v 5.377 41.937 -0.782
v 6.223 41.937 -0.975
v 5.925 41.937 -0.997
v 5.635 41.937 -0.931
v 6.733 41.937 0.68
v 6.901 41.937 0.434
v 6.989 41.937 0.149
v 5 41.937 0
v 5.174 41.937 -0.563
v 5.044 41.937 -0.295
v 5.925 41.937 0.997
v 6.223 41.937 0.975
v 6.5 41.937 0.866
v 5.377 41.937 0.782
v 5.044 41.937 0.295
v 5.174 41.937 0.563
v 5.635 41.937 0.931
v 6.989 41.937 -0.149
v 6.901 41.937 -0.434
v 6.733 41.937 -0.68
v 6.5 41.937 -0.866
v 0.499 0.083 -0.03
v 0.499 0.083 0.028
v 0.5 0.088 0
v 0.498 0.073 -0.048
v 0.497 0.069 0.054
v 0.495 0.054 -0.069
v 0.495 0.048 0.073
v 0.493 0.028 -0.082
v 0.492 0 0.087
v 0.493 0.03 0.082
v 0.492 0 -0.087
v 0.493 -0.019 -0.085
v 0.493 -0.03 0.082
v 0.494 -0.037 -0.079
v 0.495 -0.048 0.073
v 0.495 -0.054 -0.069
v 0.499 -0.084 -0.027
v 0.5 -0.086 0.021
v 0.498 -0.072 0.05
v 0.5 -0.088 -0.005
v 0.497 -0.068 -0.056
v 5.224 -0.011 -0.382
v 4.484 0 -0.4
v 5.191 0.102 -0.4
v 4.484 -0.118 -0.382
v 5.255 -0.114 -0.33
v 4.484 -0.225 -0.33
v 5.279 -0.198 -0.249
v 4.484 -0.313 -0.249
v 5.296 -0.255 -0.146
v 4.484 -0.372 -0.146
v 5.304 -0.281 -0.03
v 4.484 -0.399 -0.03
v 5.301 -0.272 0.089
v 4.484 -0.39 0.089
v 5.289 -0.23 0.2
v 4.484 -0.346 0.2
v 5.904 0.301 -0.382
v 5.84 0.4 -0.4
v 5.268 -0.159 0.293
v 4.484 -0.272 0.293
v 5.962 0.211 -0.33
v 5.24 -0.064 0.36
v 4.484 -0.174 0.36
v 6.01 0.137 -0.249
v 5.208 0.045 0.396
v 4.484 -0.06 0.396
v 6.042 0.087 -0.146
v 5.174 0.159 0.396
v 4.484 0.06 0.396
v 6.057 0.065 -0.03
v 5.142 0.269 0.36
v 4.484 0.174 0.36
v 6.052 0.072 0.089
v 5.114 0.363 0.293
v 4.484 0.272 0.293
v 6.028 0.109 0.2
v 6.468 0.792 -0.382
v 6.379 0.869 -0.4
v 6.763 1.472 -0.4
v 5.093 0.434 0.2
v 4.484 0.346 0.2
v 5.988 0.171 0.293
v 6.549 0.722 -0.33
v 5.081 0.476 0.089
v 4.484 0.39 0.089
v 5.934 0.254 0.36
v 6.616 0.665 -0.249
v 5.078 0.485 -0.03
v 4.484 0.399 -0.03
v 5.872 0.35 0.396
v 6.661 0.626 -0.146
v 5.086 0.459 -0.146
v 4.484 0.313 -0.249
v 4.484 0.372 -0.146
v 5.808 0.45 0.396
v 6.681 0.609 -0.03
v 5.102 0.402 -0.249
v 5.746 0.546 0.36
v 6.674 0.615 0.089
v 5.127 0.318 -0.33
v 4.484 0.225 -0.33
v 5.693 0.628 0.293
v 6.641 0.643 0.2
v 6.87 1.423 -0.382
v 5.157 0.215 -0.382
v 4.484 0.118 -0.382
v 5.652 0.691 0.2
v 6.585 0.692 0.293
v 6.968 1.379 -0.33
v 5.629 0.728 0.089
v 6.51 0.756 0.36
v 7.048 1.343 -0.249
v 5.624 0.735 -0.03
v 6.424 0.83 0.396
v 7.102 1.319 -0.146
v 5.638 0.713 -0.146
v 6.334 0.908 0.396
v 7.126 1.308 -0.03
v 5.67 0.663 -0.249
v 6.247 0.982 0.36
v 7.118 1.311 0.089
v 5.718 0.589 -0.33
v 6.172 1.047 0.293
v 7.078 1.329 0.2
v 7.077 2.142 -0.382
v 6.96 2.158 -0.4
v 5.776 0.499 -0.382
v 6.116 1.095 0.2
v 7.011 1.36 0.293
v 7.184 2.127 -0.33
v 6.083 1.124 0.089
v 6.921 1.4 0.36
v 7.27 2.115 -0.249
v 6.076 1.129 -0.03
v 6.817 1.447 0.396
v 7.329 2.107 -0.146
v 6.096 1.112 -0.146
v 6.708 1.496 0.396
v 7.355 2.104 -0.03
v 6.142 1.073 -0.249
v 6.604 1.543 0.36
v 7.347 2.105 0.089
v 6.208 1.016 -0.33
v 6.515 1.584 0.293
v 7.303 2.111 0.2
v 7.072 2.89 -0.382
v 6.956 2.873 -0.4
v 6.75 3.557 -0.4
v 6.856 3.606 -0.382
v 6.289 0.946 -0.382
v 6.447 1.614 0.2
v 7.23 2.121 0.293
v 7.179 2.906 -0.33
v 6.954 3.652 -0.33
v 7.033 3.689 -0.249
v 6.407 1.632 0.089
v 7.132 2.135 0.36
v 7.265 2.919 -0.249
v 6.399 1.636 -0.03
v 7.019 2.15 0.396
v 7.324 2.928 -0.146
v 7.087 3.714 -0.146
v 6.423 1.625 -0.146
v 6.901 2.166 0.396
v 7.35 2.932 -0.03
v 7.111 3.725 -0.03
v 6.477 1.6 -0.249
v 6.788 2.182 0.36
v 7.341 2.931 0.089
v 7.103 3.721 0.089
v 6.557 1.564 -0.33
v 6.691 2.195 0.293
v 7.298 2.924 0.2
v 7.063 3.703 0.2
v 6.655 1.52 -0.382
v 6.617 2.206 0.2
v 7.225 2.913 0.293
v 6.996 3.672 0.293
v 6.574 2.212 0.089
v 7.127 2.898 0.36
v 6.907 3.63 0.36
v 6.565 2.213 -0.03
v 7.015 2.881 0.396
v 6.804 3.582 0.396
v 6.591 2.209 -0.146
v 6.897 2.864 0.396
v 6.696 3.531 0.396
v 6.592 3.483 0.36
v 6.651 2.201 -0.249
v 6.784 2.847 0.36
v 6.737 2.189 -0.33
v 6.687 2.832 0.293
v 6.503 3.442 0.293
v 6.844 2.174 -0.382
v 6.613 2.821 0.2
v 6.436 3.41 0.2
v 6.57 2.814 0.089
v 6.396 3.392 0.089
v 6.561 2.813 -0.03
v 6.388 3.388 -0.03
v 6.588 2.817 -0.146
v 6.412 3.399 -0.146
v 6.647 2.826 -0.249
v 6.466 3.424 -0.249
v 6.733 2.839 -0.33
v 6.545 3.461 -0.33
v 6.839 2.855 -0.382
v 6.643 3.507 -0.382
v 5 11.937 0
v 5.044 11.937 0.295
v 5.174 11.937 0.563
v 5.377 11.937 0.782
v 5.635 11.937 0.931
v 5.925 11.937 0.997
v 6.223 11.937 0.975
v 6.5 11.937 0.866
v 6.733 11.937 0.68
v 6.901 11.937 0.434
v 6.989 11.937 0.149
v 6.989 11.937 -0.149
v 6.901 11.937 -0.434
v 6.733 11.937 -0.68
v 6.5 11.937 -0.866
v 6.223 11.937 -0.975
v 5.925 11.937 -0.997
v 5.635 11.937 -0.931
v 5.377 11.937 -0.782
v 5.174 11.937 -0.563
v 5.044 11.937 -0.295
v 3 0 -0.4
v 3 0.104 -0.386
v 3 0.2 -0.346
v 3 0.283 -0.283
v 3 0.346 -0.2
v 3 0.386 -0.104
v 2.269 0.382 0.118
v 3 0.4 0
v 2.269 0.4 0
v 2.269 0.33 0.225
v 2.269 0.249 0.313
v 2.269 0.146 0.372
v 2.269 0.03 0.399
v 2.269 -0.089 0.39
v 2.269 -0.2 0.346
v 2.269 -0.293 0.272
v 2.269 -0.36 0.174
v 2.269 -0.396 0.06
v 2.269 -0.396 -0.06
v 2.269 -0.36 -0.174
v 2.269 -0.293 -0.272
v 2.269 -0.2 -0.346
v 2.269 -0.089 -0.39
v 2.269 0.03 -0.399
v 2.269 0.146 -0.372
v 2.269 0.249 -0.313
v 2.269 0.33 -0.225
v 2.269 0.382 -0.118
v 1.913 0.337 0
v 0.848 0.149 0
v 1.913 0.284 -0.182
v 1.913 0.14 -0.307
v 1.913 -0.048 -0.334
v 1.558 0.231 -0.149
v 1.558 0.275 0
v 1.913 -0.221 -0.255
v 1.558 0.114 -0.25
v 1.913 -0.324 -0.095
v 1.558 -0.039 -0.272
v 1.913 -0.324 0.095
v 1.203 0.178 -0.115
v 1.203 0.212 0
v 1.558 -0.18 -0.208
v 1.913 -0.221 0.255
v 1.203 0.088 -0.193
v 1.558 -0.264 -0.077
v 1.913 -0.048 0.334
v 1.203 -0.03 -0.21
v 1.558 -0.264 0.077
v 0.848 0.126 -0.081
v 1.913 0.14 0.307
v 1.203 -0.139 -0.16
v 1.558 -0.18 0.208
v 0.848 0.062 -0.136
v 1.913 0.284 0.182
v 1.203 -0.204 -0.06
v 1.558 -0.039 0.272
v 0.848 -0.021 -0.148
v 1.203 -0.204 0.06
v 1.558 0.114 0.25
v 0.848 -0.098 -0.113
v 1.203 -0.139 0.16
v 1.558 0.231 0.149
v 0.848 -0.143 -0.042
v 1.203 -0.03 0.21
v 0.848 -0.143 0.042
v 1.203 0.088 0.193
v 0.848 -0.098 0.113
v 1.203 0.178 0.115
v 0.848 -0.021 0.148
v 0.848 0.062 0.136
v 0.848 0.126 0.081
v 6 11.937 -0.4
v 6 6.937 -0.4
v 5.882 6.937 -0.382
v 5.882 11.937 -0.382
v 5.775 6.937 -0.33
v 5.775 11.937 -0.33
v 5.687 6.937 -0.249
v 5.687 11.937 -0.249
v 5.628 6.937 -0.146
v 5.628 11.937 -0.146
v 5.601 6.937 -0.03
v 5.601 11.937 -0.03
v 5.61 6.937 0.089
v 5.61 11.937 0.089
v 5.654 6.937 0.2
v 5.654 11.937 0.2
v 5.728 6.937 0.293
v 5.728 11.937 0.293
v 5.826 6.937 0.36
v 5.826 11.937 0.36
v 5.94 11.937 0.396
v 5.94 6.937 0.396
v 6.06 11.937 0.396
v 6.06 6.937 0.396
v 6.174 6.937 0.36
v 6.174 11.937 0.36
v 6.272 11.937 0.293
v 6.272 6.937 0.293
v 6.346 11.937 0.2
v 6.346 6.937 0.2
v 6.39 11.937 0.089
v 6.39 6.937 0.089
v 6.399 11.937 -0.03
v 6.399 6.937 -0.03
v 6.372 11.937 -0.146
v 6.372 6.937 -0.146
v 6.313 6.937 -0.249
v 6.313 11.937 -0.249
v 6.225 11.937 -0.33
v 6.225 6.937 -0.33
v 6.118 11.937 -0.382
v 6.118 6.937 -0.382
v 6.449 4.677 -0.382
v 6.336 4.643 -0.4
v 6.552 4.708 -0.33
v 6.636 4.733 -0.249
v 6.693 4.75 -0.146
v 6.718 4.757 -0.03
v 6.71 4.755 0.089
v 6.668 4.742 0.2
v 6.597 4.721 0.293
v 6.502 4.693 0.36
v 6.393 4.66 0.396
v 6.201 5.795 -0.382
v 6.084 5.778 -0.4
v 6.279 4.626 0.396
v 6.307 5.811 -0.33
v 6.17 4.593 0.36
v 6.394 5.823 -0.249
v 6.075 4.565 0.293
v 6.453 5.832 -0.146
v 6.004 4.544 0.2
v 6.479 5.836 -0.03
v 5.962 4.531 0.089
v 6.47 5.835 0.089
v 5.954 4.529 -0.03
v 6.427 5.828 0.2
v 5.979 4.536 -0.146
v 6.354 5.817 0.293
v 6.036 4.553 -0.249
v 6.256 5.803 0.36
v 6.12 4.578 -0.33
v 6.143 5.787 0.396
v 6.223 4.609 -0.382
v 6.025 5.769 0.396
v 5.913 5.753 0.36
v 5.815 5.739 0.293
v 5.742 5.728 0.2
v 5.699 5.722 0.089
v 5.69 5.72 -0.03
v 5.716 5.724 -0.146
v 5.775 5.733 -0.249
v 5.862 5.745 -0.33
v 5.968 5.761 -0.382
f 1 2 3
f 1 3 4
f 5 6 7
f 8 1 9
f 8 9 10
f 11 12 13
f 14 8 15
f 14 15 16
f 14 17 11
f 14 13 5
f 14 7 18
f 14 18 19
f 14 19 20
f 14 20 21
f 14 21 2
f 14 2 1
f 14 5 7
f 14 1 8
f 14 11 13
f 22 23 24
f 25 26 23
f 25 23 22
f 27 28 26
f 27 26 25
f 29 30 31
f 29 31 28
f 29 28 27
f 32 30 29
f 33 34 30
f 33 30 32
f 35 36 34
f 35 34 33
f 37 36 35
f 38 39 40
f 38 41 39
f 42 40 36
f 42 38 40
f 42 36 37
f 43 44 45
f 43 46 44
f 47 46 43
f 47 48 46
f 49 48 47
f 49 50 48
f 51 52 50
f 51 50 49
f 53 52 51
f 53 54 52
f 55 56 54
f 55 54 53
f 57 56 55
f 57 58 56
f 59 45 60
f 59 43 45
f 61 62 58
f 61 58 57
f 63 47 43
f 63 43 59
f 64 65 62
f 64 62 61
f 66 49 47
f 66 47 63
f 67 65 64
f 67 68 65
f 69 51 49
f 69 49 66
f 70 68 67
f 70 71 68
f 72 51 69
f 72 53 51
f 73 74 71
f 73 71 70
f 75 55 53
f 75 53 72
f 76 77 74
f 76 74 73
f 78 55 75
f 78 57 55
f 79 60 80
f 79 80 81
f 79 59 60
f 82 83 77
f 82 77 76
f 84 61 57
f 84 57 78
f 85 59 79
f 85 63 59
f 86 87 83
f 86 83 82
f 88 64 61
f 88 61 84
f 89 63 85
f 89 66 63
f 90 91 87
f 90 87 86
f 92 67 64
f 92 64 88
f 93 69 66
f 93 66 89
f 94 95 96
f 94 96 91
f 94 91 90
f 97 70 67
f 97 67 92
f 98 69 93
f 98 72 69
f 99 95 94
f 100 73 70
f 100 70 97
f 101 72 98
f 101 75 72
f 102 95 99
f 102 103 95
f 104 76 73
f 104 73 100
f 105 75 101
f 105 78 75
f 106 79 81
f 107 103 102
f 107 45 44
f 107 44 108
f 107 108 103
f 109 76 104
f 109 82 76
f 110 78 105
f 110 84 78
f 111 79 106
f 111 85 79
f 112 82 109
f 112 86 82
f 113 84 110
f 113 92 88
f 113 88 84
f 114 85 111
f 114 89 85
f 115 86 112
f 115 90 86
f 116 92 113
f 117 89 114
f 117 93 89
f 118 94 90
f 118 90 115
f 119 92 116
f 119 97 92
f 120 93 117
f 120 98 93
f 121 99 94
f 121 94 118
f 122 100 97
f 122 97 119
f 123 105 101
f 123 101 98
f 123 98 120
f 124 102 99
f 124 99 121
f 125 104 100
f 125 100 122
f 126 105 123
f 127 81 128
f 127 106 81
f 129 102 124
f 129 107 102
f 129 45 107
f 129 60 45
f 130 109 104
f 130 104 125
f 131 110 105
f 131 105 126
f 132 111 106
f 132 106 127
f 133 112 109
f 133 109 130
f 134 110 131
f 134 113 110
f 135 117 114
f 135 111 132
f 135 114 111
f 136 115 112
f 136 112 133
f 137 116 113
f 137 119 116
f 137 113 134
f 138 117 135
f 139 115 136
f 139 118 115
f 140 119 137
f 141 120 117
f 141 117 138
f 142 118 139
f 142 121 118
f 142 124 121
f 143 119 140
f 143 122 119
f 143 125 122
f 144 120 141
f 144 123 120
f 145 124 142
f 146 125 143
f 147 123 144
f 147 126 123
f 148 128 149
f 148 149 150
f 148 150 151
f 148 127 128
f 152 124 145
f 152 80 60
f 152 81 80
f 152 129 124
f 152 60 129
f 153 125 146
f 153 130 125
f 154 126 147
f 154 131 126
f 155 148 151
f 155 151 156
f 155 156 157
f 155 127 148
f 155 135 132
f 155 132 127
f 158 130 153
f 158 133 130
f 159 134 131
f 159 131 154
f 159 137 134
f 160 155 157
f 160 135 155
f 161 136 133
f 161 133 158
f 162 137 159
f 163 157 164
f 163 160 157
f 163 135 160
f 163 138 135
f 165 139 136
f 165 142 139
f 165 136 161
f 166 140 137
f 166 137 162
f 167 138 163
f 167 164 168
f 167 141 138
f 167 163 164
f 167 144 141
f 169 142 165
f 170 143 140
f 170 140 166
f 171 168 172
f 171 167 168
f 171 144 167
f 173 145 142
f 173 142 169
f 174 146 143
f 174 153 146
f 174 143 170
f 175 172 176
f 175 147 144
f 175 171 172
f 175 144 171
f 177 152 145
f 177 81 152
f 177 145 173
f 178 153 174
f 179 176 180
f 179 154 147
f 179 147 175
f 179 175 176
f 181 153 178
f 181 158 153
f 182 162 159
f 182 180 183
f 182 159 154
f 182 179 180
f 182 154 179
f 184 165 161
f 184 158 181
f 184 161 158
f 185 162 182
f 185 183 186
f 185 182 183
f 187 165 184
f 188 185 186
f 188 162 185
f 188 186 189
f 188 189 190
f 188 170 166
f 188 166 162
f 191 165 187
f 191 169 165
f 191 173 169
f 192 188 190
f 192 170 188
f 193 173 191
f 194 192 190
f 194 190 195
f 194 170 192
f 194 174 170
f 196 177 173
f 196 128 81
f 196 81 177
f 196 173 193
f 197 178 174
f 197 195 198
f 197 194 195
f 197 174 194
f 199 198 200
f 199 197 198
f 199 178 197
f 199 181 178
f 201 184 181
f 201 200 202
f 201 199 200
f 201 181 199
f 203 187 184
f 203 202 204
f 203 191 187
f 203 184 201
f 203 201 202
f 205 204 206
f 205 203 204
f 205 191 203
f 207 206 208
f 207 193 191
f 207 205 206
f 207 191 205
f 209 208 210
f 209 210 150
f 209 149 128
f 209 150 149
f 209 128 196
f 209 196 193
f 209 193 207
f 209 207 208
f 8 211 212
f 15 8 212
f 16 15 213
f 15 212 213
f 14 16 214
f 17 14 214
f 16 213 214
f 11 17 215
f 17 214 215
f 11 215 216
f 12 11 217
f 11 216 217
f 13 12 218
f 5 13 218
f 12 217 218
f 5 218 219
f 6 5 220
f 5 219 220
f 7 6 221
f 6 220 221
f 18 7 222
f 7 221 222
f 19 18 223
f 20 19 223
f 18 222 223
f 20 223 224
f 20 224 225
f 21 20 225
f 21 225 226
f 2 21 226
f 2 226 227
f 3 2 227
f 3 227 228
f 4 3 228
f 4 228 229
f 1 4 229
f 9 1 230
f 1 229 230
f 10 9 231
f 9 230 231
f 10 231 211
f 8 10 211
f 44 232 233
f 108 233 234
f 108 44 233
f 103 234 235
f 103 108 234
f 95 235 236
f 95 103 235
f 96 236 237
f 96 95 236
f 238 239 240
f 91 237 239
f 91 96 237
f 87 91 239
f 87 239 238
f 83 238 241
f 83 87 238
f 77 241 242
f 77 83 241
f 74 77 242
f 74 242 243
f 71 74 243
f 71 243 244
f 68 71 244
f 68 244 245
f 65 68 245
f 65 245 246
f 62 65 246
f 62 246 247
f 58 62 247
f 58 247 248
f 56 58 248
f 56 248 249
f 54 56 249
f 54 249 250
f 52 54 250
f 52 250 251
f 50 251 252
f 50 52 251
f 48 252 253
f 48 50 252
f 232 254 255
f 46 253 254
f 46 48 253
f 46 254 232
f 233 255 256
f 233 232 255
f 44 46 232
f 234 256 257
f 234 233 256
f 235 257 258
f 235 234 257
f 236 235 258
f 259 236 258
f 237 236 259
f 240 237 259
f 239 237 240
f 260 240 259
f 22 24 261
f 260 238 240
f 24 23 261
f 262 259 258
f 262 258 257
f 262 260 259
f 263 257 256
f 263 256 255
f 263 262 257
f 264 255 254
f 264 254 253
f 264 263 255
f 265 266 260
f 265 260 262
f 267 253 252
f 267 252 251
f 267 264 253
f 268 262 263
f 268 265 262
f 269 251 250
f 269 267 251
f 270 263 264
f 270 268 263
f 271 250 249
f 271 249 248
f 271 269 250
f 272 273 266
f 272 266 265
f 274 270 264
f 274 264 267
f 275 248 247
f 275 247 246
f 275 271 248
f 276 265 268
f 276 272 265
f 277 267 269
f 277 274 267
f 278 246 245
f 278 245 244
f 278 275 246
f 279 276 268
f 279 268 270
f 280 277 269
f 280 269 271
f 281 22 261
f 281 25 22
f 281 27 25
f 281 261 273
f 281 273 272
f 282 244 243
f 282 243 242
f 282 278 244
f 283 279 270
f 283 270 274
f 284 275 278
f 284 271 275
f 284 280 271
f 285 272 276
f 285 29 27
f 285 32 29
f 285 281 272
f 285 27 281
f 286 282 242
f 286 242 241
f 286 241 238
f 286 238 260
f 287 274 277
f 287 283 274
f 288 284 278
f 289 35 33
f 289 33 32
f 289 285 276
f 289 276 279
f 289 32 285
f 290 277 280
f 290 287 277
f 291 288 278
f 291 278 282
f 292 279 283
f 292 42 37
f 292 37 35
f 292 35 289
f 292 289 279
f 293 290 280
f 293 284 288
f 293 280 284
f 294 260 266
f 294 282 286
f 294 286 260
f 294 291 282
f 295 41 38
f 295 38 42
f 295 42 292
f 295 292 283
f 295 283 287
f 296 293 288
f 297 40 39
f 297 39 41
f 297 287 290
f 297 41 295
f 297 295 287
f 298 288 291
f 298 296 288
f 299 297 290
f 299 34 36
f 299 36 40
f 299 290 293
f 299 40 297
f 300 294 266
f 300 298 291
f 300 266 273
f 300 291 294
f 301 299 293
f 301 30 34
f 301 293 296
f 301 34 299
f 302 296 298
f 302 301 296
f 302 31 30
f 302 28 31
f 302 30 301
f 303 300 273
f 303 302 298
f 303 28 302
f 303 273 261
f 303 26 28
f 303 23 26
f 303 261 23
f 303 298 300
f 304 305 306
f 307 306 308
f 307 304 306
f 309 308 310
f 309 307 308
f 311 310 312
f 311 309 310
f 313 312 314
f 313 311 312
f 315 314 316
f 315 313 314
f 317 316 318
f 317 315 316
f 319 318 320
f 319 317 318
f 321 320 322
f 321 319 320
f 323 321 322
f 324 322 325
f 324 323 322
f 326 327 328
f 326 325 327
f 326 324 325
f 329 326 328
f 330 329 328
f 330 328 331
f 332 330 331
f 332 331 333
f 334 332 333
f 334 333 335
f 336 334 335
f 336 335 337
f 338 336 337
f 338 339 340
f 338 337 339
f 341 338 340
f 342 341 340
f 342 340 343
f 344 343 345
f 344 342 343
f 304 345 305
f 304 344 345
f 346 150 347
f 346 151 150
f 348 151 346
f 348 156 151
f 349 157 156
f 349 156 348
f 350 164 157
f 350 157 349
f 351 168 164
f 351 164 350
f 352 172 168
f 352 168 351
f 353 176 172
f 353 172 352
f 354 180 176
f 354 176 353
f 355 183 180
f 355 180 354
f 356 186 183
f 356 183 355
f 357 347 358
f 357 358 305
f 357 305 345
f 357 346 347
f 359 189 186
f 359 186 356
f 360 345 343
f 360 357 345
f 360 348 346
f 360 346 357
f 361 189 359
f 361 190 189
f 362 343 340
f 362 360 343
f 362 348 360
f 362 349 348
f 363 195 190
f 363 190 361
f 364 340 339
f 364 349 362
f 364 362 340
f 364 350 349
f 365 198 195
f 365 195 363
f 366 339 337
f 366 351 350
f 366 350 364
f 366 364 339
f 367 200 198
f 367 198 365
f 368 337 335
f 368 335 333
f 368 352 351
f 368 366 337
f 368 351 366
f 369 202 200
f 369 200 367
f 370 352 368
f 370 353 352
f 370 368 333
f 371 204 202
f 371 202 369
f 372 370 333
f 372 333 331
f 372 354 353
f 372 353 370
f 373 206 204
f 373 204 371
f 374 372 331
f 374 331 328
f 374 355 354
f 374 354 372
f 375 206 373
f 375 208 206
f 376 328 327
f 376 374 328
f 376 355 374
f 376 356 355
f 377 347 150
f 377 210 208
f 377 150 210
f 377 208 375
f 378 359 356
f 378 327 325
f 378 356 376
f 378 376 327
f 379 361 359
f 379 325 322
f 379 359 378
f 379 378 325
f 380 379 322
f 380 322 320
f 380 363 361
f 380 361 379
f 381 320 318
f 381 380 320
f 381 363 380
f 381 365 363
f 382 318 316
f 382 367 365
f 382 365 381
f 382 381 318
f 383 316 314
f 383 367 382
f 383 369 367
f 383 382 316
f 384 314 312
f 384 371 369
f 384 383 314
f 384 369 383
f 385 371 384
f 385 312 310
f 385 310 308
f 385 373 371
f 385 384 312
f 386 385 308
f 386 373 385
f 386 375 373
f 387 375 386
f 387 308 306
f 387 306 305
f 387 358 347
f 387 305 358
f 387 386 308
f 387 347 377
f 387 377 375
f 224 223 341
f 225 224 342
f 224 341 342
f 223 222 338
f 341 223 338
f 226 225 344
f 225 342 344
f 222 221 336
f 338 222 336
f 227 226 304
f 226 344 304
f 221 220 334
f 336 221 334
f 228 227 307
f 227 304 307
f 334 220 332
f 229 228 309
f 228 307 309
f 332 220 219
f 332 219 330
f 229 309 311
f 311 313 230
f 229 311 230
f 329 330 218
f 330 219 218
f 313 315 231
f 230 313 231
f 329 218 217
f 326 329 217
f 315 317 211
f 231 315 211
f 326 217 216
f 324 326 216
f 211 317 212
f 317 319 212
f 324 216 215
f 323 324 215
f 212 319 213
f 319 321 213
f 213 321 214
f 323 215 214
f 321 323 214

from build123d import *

# Parameters (mm, degrees)
SKETCH2_R               = 0.5
CUT_EXTRUDE1_DEPTH      = 4.052867504
CUT_EXTRUDE1_DEPTH_BACK = 4.052867504
SKETCH3_R               = 0.4
SKETCH5_R               = 1
BOSS_EXTRUDE1_DEPTH     = 30


with BuildPart() as part:
    # Sketch1 → Revolve1 (revolve)
    with BuildSketch(Plane.XY, mode=Mode.PRIVATE) as revolve1_sk:
        Polygon((0, 0), (3, 0), (3, -0.4), (2.268512728, -0.4), align=None)
    revolve(revolve1_sk.sketch.rotate(Axis((0, 0, 0), (-1, 0, 0)), 180), axis=Axis((0, 0, 0), (-1, 0, 0)))

    # Sketch2 → Cut-Extrude1 (cut, two sides)
    with BuildSketch(Plane(origin=(0, 0, 0), x_dir=(1, 0, 0), z_dir=(0, 1, 0))) as cut_extrude1_sk:
        Circle(SKETCH2_R)
    extrude(amount=CUT_EXTRUDE1_DEPTH, mode=Mode.SUBTRACT)
    extrude(cut_extrude1_sk.sketch, amount=-CUT_EXTRUDE1_DEPTH_BACK, mode=Mode.SUBTRACT)

    # Sweep1: sweep along a path in Sketch4
    with BuildLine(Plane.XY) as sweep1_path:
        Line((3, 0), (4.483768236, 0))
        ThreePointArc((4.483768236, 0), (6.592246851, 1.156750979), (6.749537704, 3.556545654))
        ThreePointArc((6.749537704, 3.556545654), (6.189631943, 5.205974837), (6, 6.937491748))
        Line((6, 6.937491748), (6, 11.937491748))
    # Sketch3 → Sweep1 (sweep)
    with BuildSketch(Plane(origin=(3, 0, 0), x_dir=(0, 0, -1), z_dir=(1, 0, 0))):
        Circle(SKETCH3_R)
    sweep(path=sweep1_path.line)

    # Sketch5 → Boss-Extrude1 (add)
    with BuildSketch(Plane(origin=(0, 11.937491748, 0), x_dir=(-1, 0, 0), z_dir=(0, 1, 0))):
        with Locations((-6, 0)):
            Circle(SKETCH5_R)
    extrude(amount=BOSS_EXTRUDE1_DEPTH)


solid = part.part
